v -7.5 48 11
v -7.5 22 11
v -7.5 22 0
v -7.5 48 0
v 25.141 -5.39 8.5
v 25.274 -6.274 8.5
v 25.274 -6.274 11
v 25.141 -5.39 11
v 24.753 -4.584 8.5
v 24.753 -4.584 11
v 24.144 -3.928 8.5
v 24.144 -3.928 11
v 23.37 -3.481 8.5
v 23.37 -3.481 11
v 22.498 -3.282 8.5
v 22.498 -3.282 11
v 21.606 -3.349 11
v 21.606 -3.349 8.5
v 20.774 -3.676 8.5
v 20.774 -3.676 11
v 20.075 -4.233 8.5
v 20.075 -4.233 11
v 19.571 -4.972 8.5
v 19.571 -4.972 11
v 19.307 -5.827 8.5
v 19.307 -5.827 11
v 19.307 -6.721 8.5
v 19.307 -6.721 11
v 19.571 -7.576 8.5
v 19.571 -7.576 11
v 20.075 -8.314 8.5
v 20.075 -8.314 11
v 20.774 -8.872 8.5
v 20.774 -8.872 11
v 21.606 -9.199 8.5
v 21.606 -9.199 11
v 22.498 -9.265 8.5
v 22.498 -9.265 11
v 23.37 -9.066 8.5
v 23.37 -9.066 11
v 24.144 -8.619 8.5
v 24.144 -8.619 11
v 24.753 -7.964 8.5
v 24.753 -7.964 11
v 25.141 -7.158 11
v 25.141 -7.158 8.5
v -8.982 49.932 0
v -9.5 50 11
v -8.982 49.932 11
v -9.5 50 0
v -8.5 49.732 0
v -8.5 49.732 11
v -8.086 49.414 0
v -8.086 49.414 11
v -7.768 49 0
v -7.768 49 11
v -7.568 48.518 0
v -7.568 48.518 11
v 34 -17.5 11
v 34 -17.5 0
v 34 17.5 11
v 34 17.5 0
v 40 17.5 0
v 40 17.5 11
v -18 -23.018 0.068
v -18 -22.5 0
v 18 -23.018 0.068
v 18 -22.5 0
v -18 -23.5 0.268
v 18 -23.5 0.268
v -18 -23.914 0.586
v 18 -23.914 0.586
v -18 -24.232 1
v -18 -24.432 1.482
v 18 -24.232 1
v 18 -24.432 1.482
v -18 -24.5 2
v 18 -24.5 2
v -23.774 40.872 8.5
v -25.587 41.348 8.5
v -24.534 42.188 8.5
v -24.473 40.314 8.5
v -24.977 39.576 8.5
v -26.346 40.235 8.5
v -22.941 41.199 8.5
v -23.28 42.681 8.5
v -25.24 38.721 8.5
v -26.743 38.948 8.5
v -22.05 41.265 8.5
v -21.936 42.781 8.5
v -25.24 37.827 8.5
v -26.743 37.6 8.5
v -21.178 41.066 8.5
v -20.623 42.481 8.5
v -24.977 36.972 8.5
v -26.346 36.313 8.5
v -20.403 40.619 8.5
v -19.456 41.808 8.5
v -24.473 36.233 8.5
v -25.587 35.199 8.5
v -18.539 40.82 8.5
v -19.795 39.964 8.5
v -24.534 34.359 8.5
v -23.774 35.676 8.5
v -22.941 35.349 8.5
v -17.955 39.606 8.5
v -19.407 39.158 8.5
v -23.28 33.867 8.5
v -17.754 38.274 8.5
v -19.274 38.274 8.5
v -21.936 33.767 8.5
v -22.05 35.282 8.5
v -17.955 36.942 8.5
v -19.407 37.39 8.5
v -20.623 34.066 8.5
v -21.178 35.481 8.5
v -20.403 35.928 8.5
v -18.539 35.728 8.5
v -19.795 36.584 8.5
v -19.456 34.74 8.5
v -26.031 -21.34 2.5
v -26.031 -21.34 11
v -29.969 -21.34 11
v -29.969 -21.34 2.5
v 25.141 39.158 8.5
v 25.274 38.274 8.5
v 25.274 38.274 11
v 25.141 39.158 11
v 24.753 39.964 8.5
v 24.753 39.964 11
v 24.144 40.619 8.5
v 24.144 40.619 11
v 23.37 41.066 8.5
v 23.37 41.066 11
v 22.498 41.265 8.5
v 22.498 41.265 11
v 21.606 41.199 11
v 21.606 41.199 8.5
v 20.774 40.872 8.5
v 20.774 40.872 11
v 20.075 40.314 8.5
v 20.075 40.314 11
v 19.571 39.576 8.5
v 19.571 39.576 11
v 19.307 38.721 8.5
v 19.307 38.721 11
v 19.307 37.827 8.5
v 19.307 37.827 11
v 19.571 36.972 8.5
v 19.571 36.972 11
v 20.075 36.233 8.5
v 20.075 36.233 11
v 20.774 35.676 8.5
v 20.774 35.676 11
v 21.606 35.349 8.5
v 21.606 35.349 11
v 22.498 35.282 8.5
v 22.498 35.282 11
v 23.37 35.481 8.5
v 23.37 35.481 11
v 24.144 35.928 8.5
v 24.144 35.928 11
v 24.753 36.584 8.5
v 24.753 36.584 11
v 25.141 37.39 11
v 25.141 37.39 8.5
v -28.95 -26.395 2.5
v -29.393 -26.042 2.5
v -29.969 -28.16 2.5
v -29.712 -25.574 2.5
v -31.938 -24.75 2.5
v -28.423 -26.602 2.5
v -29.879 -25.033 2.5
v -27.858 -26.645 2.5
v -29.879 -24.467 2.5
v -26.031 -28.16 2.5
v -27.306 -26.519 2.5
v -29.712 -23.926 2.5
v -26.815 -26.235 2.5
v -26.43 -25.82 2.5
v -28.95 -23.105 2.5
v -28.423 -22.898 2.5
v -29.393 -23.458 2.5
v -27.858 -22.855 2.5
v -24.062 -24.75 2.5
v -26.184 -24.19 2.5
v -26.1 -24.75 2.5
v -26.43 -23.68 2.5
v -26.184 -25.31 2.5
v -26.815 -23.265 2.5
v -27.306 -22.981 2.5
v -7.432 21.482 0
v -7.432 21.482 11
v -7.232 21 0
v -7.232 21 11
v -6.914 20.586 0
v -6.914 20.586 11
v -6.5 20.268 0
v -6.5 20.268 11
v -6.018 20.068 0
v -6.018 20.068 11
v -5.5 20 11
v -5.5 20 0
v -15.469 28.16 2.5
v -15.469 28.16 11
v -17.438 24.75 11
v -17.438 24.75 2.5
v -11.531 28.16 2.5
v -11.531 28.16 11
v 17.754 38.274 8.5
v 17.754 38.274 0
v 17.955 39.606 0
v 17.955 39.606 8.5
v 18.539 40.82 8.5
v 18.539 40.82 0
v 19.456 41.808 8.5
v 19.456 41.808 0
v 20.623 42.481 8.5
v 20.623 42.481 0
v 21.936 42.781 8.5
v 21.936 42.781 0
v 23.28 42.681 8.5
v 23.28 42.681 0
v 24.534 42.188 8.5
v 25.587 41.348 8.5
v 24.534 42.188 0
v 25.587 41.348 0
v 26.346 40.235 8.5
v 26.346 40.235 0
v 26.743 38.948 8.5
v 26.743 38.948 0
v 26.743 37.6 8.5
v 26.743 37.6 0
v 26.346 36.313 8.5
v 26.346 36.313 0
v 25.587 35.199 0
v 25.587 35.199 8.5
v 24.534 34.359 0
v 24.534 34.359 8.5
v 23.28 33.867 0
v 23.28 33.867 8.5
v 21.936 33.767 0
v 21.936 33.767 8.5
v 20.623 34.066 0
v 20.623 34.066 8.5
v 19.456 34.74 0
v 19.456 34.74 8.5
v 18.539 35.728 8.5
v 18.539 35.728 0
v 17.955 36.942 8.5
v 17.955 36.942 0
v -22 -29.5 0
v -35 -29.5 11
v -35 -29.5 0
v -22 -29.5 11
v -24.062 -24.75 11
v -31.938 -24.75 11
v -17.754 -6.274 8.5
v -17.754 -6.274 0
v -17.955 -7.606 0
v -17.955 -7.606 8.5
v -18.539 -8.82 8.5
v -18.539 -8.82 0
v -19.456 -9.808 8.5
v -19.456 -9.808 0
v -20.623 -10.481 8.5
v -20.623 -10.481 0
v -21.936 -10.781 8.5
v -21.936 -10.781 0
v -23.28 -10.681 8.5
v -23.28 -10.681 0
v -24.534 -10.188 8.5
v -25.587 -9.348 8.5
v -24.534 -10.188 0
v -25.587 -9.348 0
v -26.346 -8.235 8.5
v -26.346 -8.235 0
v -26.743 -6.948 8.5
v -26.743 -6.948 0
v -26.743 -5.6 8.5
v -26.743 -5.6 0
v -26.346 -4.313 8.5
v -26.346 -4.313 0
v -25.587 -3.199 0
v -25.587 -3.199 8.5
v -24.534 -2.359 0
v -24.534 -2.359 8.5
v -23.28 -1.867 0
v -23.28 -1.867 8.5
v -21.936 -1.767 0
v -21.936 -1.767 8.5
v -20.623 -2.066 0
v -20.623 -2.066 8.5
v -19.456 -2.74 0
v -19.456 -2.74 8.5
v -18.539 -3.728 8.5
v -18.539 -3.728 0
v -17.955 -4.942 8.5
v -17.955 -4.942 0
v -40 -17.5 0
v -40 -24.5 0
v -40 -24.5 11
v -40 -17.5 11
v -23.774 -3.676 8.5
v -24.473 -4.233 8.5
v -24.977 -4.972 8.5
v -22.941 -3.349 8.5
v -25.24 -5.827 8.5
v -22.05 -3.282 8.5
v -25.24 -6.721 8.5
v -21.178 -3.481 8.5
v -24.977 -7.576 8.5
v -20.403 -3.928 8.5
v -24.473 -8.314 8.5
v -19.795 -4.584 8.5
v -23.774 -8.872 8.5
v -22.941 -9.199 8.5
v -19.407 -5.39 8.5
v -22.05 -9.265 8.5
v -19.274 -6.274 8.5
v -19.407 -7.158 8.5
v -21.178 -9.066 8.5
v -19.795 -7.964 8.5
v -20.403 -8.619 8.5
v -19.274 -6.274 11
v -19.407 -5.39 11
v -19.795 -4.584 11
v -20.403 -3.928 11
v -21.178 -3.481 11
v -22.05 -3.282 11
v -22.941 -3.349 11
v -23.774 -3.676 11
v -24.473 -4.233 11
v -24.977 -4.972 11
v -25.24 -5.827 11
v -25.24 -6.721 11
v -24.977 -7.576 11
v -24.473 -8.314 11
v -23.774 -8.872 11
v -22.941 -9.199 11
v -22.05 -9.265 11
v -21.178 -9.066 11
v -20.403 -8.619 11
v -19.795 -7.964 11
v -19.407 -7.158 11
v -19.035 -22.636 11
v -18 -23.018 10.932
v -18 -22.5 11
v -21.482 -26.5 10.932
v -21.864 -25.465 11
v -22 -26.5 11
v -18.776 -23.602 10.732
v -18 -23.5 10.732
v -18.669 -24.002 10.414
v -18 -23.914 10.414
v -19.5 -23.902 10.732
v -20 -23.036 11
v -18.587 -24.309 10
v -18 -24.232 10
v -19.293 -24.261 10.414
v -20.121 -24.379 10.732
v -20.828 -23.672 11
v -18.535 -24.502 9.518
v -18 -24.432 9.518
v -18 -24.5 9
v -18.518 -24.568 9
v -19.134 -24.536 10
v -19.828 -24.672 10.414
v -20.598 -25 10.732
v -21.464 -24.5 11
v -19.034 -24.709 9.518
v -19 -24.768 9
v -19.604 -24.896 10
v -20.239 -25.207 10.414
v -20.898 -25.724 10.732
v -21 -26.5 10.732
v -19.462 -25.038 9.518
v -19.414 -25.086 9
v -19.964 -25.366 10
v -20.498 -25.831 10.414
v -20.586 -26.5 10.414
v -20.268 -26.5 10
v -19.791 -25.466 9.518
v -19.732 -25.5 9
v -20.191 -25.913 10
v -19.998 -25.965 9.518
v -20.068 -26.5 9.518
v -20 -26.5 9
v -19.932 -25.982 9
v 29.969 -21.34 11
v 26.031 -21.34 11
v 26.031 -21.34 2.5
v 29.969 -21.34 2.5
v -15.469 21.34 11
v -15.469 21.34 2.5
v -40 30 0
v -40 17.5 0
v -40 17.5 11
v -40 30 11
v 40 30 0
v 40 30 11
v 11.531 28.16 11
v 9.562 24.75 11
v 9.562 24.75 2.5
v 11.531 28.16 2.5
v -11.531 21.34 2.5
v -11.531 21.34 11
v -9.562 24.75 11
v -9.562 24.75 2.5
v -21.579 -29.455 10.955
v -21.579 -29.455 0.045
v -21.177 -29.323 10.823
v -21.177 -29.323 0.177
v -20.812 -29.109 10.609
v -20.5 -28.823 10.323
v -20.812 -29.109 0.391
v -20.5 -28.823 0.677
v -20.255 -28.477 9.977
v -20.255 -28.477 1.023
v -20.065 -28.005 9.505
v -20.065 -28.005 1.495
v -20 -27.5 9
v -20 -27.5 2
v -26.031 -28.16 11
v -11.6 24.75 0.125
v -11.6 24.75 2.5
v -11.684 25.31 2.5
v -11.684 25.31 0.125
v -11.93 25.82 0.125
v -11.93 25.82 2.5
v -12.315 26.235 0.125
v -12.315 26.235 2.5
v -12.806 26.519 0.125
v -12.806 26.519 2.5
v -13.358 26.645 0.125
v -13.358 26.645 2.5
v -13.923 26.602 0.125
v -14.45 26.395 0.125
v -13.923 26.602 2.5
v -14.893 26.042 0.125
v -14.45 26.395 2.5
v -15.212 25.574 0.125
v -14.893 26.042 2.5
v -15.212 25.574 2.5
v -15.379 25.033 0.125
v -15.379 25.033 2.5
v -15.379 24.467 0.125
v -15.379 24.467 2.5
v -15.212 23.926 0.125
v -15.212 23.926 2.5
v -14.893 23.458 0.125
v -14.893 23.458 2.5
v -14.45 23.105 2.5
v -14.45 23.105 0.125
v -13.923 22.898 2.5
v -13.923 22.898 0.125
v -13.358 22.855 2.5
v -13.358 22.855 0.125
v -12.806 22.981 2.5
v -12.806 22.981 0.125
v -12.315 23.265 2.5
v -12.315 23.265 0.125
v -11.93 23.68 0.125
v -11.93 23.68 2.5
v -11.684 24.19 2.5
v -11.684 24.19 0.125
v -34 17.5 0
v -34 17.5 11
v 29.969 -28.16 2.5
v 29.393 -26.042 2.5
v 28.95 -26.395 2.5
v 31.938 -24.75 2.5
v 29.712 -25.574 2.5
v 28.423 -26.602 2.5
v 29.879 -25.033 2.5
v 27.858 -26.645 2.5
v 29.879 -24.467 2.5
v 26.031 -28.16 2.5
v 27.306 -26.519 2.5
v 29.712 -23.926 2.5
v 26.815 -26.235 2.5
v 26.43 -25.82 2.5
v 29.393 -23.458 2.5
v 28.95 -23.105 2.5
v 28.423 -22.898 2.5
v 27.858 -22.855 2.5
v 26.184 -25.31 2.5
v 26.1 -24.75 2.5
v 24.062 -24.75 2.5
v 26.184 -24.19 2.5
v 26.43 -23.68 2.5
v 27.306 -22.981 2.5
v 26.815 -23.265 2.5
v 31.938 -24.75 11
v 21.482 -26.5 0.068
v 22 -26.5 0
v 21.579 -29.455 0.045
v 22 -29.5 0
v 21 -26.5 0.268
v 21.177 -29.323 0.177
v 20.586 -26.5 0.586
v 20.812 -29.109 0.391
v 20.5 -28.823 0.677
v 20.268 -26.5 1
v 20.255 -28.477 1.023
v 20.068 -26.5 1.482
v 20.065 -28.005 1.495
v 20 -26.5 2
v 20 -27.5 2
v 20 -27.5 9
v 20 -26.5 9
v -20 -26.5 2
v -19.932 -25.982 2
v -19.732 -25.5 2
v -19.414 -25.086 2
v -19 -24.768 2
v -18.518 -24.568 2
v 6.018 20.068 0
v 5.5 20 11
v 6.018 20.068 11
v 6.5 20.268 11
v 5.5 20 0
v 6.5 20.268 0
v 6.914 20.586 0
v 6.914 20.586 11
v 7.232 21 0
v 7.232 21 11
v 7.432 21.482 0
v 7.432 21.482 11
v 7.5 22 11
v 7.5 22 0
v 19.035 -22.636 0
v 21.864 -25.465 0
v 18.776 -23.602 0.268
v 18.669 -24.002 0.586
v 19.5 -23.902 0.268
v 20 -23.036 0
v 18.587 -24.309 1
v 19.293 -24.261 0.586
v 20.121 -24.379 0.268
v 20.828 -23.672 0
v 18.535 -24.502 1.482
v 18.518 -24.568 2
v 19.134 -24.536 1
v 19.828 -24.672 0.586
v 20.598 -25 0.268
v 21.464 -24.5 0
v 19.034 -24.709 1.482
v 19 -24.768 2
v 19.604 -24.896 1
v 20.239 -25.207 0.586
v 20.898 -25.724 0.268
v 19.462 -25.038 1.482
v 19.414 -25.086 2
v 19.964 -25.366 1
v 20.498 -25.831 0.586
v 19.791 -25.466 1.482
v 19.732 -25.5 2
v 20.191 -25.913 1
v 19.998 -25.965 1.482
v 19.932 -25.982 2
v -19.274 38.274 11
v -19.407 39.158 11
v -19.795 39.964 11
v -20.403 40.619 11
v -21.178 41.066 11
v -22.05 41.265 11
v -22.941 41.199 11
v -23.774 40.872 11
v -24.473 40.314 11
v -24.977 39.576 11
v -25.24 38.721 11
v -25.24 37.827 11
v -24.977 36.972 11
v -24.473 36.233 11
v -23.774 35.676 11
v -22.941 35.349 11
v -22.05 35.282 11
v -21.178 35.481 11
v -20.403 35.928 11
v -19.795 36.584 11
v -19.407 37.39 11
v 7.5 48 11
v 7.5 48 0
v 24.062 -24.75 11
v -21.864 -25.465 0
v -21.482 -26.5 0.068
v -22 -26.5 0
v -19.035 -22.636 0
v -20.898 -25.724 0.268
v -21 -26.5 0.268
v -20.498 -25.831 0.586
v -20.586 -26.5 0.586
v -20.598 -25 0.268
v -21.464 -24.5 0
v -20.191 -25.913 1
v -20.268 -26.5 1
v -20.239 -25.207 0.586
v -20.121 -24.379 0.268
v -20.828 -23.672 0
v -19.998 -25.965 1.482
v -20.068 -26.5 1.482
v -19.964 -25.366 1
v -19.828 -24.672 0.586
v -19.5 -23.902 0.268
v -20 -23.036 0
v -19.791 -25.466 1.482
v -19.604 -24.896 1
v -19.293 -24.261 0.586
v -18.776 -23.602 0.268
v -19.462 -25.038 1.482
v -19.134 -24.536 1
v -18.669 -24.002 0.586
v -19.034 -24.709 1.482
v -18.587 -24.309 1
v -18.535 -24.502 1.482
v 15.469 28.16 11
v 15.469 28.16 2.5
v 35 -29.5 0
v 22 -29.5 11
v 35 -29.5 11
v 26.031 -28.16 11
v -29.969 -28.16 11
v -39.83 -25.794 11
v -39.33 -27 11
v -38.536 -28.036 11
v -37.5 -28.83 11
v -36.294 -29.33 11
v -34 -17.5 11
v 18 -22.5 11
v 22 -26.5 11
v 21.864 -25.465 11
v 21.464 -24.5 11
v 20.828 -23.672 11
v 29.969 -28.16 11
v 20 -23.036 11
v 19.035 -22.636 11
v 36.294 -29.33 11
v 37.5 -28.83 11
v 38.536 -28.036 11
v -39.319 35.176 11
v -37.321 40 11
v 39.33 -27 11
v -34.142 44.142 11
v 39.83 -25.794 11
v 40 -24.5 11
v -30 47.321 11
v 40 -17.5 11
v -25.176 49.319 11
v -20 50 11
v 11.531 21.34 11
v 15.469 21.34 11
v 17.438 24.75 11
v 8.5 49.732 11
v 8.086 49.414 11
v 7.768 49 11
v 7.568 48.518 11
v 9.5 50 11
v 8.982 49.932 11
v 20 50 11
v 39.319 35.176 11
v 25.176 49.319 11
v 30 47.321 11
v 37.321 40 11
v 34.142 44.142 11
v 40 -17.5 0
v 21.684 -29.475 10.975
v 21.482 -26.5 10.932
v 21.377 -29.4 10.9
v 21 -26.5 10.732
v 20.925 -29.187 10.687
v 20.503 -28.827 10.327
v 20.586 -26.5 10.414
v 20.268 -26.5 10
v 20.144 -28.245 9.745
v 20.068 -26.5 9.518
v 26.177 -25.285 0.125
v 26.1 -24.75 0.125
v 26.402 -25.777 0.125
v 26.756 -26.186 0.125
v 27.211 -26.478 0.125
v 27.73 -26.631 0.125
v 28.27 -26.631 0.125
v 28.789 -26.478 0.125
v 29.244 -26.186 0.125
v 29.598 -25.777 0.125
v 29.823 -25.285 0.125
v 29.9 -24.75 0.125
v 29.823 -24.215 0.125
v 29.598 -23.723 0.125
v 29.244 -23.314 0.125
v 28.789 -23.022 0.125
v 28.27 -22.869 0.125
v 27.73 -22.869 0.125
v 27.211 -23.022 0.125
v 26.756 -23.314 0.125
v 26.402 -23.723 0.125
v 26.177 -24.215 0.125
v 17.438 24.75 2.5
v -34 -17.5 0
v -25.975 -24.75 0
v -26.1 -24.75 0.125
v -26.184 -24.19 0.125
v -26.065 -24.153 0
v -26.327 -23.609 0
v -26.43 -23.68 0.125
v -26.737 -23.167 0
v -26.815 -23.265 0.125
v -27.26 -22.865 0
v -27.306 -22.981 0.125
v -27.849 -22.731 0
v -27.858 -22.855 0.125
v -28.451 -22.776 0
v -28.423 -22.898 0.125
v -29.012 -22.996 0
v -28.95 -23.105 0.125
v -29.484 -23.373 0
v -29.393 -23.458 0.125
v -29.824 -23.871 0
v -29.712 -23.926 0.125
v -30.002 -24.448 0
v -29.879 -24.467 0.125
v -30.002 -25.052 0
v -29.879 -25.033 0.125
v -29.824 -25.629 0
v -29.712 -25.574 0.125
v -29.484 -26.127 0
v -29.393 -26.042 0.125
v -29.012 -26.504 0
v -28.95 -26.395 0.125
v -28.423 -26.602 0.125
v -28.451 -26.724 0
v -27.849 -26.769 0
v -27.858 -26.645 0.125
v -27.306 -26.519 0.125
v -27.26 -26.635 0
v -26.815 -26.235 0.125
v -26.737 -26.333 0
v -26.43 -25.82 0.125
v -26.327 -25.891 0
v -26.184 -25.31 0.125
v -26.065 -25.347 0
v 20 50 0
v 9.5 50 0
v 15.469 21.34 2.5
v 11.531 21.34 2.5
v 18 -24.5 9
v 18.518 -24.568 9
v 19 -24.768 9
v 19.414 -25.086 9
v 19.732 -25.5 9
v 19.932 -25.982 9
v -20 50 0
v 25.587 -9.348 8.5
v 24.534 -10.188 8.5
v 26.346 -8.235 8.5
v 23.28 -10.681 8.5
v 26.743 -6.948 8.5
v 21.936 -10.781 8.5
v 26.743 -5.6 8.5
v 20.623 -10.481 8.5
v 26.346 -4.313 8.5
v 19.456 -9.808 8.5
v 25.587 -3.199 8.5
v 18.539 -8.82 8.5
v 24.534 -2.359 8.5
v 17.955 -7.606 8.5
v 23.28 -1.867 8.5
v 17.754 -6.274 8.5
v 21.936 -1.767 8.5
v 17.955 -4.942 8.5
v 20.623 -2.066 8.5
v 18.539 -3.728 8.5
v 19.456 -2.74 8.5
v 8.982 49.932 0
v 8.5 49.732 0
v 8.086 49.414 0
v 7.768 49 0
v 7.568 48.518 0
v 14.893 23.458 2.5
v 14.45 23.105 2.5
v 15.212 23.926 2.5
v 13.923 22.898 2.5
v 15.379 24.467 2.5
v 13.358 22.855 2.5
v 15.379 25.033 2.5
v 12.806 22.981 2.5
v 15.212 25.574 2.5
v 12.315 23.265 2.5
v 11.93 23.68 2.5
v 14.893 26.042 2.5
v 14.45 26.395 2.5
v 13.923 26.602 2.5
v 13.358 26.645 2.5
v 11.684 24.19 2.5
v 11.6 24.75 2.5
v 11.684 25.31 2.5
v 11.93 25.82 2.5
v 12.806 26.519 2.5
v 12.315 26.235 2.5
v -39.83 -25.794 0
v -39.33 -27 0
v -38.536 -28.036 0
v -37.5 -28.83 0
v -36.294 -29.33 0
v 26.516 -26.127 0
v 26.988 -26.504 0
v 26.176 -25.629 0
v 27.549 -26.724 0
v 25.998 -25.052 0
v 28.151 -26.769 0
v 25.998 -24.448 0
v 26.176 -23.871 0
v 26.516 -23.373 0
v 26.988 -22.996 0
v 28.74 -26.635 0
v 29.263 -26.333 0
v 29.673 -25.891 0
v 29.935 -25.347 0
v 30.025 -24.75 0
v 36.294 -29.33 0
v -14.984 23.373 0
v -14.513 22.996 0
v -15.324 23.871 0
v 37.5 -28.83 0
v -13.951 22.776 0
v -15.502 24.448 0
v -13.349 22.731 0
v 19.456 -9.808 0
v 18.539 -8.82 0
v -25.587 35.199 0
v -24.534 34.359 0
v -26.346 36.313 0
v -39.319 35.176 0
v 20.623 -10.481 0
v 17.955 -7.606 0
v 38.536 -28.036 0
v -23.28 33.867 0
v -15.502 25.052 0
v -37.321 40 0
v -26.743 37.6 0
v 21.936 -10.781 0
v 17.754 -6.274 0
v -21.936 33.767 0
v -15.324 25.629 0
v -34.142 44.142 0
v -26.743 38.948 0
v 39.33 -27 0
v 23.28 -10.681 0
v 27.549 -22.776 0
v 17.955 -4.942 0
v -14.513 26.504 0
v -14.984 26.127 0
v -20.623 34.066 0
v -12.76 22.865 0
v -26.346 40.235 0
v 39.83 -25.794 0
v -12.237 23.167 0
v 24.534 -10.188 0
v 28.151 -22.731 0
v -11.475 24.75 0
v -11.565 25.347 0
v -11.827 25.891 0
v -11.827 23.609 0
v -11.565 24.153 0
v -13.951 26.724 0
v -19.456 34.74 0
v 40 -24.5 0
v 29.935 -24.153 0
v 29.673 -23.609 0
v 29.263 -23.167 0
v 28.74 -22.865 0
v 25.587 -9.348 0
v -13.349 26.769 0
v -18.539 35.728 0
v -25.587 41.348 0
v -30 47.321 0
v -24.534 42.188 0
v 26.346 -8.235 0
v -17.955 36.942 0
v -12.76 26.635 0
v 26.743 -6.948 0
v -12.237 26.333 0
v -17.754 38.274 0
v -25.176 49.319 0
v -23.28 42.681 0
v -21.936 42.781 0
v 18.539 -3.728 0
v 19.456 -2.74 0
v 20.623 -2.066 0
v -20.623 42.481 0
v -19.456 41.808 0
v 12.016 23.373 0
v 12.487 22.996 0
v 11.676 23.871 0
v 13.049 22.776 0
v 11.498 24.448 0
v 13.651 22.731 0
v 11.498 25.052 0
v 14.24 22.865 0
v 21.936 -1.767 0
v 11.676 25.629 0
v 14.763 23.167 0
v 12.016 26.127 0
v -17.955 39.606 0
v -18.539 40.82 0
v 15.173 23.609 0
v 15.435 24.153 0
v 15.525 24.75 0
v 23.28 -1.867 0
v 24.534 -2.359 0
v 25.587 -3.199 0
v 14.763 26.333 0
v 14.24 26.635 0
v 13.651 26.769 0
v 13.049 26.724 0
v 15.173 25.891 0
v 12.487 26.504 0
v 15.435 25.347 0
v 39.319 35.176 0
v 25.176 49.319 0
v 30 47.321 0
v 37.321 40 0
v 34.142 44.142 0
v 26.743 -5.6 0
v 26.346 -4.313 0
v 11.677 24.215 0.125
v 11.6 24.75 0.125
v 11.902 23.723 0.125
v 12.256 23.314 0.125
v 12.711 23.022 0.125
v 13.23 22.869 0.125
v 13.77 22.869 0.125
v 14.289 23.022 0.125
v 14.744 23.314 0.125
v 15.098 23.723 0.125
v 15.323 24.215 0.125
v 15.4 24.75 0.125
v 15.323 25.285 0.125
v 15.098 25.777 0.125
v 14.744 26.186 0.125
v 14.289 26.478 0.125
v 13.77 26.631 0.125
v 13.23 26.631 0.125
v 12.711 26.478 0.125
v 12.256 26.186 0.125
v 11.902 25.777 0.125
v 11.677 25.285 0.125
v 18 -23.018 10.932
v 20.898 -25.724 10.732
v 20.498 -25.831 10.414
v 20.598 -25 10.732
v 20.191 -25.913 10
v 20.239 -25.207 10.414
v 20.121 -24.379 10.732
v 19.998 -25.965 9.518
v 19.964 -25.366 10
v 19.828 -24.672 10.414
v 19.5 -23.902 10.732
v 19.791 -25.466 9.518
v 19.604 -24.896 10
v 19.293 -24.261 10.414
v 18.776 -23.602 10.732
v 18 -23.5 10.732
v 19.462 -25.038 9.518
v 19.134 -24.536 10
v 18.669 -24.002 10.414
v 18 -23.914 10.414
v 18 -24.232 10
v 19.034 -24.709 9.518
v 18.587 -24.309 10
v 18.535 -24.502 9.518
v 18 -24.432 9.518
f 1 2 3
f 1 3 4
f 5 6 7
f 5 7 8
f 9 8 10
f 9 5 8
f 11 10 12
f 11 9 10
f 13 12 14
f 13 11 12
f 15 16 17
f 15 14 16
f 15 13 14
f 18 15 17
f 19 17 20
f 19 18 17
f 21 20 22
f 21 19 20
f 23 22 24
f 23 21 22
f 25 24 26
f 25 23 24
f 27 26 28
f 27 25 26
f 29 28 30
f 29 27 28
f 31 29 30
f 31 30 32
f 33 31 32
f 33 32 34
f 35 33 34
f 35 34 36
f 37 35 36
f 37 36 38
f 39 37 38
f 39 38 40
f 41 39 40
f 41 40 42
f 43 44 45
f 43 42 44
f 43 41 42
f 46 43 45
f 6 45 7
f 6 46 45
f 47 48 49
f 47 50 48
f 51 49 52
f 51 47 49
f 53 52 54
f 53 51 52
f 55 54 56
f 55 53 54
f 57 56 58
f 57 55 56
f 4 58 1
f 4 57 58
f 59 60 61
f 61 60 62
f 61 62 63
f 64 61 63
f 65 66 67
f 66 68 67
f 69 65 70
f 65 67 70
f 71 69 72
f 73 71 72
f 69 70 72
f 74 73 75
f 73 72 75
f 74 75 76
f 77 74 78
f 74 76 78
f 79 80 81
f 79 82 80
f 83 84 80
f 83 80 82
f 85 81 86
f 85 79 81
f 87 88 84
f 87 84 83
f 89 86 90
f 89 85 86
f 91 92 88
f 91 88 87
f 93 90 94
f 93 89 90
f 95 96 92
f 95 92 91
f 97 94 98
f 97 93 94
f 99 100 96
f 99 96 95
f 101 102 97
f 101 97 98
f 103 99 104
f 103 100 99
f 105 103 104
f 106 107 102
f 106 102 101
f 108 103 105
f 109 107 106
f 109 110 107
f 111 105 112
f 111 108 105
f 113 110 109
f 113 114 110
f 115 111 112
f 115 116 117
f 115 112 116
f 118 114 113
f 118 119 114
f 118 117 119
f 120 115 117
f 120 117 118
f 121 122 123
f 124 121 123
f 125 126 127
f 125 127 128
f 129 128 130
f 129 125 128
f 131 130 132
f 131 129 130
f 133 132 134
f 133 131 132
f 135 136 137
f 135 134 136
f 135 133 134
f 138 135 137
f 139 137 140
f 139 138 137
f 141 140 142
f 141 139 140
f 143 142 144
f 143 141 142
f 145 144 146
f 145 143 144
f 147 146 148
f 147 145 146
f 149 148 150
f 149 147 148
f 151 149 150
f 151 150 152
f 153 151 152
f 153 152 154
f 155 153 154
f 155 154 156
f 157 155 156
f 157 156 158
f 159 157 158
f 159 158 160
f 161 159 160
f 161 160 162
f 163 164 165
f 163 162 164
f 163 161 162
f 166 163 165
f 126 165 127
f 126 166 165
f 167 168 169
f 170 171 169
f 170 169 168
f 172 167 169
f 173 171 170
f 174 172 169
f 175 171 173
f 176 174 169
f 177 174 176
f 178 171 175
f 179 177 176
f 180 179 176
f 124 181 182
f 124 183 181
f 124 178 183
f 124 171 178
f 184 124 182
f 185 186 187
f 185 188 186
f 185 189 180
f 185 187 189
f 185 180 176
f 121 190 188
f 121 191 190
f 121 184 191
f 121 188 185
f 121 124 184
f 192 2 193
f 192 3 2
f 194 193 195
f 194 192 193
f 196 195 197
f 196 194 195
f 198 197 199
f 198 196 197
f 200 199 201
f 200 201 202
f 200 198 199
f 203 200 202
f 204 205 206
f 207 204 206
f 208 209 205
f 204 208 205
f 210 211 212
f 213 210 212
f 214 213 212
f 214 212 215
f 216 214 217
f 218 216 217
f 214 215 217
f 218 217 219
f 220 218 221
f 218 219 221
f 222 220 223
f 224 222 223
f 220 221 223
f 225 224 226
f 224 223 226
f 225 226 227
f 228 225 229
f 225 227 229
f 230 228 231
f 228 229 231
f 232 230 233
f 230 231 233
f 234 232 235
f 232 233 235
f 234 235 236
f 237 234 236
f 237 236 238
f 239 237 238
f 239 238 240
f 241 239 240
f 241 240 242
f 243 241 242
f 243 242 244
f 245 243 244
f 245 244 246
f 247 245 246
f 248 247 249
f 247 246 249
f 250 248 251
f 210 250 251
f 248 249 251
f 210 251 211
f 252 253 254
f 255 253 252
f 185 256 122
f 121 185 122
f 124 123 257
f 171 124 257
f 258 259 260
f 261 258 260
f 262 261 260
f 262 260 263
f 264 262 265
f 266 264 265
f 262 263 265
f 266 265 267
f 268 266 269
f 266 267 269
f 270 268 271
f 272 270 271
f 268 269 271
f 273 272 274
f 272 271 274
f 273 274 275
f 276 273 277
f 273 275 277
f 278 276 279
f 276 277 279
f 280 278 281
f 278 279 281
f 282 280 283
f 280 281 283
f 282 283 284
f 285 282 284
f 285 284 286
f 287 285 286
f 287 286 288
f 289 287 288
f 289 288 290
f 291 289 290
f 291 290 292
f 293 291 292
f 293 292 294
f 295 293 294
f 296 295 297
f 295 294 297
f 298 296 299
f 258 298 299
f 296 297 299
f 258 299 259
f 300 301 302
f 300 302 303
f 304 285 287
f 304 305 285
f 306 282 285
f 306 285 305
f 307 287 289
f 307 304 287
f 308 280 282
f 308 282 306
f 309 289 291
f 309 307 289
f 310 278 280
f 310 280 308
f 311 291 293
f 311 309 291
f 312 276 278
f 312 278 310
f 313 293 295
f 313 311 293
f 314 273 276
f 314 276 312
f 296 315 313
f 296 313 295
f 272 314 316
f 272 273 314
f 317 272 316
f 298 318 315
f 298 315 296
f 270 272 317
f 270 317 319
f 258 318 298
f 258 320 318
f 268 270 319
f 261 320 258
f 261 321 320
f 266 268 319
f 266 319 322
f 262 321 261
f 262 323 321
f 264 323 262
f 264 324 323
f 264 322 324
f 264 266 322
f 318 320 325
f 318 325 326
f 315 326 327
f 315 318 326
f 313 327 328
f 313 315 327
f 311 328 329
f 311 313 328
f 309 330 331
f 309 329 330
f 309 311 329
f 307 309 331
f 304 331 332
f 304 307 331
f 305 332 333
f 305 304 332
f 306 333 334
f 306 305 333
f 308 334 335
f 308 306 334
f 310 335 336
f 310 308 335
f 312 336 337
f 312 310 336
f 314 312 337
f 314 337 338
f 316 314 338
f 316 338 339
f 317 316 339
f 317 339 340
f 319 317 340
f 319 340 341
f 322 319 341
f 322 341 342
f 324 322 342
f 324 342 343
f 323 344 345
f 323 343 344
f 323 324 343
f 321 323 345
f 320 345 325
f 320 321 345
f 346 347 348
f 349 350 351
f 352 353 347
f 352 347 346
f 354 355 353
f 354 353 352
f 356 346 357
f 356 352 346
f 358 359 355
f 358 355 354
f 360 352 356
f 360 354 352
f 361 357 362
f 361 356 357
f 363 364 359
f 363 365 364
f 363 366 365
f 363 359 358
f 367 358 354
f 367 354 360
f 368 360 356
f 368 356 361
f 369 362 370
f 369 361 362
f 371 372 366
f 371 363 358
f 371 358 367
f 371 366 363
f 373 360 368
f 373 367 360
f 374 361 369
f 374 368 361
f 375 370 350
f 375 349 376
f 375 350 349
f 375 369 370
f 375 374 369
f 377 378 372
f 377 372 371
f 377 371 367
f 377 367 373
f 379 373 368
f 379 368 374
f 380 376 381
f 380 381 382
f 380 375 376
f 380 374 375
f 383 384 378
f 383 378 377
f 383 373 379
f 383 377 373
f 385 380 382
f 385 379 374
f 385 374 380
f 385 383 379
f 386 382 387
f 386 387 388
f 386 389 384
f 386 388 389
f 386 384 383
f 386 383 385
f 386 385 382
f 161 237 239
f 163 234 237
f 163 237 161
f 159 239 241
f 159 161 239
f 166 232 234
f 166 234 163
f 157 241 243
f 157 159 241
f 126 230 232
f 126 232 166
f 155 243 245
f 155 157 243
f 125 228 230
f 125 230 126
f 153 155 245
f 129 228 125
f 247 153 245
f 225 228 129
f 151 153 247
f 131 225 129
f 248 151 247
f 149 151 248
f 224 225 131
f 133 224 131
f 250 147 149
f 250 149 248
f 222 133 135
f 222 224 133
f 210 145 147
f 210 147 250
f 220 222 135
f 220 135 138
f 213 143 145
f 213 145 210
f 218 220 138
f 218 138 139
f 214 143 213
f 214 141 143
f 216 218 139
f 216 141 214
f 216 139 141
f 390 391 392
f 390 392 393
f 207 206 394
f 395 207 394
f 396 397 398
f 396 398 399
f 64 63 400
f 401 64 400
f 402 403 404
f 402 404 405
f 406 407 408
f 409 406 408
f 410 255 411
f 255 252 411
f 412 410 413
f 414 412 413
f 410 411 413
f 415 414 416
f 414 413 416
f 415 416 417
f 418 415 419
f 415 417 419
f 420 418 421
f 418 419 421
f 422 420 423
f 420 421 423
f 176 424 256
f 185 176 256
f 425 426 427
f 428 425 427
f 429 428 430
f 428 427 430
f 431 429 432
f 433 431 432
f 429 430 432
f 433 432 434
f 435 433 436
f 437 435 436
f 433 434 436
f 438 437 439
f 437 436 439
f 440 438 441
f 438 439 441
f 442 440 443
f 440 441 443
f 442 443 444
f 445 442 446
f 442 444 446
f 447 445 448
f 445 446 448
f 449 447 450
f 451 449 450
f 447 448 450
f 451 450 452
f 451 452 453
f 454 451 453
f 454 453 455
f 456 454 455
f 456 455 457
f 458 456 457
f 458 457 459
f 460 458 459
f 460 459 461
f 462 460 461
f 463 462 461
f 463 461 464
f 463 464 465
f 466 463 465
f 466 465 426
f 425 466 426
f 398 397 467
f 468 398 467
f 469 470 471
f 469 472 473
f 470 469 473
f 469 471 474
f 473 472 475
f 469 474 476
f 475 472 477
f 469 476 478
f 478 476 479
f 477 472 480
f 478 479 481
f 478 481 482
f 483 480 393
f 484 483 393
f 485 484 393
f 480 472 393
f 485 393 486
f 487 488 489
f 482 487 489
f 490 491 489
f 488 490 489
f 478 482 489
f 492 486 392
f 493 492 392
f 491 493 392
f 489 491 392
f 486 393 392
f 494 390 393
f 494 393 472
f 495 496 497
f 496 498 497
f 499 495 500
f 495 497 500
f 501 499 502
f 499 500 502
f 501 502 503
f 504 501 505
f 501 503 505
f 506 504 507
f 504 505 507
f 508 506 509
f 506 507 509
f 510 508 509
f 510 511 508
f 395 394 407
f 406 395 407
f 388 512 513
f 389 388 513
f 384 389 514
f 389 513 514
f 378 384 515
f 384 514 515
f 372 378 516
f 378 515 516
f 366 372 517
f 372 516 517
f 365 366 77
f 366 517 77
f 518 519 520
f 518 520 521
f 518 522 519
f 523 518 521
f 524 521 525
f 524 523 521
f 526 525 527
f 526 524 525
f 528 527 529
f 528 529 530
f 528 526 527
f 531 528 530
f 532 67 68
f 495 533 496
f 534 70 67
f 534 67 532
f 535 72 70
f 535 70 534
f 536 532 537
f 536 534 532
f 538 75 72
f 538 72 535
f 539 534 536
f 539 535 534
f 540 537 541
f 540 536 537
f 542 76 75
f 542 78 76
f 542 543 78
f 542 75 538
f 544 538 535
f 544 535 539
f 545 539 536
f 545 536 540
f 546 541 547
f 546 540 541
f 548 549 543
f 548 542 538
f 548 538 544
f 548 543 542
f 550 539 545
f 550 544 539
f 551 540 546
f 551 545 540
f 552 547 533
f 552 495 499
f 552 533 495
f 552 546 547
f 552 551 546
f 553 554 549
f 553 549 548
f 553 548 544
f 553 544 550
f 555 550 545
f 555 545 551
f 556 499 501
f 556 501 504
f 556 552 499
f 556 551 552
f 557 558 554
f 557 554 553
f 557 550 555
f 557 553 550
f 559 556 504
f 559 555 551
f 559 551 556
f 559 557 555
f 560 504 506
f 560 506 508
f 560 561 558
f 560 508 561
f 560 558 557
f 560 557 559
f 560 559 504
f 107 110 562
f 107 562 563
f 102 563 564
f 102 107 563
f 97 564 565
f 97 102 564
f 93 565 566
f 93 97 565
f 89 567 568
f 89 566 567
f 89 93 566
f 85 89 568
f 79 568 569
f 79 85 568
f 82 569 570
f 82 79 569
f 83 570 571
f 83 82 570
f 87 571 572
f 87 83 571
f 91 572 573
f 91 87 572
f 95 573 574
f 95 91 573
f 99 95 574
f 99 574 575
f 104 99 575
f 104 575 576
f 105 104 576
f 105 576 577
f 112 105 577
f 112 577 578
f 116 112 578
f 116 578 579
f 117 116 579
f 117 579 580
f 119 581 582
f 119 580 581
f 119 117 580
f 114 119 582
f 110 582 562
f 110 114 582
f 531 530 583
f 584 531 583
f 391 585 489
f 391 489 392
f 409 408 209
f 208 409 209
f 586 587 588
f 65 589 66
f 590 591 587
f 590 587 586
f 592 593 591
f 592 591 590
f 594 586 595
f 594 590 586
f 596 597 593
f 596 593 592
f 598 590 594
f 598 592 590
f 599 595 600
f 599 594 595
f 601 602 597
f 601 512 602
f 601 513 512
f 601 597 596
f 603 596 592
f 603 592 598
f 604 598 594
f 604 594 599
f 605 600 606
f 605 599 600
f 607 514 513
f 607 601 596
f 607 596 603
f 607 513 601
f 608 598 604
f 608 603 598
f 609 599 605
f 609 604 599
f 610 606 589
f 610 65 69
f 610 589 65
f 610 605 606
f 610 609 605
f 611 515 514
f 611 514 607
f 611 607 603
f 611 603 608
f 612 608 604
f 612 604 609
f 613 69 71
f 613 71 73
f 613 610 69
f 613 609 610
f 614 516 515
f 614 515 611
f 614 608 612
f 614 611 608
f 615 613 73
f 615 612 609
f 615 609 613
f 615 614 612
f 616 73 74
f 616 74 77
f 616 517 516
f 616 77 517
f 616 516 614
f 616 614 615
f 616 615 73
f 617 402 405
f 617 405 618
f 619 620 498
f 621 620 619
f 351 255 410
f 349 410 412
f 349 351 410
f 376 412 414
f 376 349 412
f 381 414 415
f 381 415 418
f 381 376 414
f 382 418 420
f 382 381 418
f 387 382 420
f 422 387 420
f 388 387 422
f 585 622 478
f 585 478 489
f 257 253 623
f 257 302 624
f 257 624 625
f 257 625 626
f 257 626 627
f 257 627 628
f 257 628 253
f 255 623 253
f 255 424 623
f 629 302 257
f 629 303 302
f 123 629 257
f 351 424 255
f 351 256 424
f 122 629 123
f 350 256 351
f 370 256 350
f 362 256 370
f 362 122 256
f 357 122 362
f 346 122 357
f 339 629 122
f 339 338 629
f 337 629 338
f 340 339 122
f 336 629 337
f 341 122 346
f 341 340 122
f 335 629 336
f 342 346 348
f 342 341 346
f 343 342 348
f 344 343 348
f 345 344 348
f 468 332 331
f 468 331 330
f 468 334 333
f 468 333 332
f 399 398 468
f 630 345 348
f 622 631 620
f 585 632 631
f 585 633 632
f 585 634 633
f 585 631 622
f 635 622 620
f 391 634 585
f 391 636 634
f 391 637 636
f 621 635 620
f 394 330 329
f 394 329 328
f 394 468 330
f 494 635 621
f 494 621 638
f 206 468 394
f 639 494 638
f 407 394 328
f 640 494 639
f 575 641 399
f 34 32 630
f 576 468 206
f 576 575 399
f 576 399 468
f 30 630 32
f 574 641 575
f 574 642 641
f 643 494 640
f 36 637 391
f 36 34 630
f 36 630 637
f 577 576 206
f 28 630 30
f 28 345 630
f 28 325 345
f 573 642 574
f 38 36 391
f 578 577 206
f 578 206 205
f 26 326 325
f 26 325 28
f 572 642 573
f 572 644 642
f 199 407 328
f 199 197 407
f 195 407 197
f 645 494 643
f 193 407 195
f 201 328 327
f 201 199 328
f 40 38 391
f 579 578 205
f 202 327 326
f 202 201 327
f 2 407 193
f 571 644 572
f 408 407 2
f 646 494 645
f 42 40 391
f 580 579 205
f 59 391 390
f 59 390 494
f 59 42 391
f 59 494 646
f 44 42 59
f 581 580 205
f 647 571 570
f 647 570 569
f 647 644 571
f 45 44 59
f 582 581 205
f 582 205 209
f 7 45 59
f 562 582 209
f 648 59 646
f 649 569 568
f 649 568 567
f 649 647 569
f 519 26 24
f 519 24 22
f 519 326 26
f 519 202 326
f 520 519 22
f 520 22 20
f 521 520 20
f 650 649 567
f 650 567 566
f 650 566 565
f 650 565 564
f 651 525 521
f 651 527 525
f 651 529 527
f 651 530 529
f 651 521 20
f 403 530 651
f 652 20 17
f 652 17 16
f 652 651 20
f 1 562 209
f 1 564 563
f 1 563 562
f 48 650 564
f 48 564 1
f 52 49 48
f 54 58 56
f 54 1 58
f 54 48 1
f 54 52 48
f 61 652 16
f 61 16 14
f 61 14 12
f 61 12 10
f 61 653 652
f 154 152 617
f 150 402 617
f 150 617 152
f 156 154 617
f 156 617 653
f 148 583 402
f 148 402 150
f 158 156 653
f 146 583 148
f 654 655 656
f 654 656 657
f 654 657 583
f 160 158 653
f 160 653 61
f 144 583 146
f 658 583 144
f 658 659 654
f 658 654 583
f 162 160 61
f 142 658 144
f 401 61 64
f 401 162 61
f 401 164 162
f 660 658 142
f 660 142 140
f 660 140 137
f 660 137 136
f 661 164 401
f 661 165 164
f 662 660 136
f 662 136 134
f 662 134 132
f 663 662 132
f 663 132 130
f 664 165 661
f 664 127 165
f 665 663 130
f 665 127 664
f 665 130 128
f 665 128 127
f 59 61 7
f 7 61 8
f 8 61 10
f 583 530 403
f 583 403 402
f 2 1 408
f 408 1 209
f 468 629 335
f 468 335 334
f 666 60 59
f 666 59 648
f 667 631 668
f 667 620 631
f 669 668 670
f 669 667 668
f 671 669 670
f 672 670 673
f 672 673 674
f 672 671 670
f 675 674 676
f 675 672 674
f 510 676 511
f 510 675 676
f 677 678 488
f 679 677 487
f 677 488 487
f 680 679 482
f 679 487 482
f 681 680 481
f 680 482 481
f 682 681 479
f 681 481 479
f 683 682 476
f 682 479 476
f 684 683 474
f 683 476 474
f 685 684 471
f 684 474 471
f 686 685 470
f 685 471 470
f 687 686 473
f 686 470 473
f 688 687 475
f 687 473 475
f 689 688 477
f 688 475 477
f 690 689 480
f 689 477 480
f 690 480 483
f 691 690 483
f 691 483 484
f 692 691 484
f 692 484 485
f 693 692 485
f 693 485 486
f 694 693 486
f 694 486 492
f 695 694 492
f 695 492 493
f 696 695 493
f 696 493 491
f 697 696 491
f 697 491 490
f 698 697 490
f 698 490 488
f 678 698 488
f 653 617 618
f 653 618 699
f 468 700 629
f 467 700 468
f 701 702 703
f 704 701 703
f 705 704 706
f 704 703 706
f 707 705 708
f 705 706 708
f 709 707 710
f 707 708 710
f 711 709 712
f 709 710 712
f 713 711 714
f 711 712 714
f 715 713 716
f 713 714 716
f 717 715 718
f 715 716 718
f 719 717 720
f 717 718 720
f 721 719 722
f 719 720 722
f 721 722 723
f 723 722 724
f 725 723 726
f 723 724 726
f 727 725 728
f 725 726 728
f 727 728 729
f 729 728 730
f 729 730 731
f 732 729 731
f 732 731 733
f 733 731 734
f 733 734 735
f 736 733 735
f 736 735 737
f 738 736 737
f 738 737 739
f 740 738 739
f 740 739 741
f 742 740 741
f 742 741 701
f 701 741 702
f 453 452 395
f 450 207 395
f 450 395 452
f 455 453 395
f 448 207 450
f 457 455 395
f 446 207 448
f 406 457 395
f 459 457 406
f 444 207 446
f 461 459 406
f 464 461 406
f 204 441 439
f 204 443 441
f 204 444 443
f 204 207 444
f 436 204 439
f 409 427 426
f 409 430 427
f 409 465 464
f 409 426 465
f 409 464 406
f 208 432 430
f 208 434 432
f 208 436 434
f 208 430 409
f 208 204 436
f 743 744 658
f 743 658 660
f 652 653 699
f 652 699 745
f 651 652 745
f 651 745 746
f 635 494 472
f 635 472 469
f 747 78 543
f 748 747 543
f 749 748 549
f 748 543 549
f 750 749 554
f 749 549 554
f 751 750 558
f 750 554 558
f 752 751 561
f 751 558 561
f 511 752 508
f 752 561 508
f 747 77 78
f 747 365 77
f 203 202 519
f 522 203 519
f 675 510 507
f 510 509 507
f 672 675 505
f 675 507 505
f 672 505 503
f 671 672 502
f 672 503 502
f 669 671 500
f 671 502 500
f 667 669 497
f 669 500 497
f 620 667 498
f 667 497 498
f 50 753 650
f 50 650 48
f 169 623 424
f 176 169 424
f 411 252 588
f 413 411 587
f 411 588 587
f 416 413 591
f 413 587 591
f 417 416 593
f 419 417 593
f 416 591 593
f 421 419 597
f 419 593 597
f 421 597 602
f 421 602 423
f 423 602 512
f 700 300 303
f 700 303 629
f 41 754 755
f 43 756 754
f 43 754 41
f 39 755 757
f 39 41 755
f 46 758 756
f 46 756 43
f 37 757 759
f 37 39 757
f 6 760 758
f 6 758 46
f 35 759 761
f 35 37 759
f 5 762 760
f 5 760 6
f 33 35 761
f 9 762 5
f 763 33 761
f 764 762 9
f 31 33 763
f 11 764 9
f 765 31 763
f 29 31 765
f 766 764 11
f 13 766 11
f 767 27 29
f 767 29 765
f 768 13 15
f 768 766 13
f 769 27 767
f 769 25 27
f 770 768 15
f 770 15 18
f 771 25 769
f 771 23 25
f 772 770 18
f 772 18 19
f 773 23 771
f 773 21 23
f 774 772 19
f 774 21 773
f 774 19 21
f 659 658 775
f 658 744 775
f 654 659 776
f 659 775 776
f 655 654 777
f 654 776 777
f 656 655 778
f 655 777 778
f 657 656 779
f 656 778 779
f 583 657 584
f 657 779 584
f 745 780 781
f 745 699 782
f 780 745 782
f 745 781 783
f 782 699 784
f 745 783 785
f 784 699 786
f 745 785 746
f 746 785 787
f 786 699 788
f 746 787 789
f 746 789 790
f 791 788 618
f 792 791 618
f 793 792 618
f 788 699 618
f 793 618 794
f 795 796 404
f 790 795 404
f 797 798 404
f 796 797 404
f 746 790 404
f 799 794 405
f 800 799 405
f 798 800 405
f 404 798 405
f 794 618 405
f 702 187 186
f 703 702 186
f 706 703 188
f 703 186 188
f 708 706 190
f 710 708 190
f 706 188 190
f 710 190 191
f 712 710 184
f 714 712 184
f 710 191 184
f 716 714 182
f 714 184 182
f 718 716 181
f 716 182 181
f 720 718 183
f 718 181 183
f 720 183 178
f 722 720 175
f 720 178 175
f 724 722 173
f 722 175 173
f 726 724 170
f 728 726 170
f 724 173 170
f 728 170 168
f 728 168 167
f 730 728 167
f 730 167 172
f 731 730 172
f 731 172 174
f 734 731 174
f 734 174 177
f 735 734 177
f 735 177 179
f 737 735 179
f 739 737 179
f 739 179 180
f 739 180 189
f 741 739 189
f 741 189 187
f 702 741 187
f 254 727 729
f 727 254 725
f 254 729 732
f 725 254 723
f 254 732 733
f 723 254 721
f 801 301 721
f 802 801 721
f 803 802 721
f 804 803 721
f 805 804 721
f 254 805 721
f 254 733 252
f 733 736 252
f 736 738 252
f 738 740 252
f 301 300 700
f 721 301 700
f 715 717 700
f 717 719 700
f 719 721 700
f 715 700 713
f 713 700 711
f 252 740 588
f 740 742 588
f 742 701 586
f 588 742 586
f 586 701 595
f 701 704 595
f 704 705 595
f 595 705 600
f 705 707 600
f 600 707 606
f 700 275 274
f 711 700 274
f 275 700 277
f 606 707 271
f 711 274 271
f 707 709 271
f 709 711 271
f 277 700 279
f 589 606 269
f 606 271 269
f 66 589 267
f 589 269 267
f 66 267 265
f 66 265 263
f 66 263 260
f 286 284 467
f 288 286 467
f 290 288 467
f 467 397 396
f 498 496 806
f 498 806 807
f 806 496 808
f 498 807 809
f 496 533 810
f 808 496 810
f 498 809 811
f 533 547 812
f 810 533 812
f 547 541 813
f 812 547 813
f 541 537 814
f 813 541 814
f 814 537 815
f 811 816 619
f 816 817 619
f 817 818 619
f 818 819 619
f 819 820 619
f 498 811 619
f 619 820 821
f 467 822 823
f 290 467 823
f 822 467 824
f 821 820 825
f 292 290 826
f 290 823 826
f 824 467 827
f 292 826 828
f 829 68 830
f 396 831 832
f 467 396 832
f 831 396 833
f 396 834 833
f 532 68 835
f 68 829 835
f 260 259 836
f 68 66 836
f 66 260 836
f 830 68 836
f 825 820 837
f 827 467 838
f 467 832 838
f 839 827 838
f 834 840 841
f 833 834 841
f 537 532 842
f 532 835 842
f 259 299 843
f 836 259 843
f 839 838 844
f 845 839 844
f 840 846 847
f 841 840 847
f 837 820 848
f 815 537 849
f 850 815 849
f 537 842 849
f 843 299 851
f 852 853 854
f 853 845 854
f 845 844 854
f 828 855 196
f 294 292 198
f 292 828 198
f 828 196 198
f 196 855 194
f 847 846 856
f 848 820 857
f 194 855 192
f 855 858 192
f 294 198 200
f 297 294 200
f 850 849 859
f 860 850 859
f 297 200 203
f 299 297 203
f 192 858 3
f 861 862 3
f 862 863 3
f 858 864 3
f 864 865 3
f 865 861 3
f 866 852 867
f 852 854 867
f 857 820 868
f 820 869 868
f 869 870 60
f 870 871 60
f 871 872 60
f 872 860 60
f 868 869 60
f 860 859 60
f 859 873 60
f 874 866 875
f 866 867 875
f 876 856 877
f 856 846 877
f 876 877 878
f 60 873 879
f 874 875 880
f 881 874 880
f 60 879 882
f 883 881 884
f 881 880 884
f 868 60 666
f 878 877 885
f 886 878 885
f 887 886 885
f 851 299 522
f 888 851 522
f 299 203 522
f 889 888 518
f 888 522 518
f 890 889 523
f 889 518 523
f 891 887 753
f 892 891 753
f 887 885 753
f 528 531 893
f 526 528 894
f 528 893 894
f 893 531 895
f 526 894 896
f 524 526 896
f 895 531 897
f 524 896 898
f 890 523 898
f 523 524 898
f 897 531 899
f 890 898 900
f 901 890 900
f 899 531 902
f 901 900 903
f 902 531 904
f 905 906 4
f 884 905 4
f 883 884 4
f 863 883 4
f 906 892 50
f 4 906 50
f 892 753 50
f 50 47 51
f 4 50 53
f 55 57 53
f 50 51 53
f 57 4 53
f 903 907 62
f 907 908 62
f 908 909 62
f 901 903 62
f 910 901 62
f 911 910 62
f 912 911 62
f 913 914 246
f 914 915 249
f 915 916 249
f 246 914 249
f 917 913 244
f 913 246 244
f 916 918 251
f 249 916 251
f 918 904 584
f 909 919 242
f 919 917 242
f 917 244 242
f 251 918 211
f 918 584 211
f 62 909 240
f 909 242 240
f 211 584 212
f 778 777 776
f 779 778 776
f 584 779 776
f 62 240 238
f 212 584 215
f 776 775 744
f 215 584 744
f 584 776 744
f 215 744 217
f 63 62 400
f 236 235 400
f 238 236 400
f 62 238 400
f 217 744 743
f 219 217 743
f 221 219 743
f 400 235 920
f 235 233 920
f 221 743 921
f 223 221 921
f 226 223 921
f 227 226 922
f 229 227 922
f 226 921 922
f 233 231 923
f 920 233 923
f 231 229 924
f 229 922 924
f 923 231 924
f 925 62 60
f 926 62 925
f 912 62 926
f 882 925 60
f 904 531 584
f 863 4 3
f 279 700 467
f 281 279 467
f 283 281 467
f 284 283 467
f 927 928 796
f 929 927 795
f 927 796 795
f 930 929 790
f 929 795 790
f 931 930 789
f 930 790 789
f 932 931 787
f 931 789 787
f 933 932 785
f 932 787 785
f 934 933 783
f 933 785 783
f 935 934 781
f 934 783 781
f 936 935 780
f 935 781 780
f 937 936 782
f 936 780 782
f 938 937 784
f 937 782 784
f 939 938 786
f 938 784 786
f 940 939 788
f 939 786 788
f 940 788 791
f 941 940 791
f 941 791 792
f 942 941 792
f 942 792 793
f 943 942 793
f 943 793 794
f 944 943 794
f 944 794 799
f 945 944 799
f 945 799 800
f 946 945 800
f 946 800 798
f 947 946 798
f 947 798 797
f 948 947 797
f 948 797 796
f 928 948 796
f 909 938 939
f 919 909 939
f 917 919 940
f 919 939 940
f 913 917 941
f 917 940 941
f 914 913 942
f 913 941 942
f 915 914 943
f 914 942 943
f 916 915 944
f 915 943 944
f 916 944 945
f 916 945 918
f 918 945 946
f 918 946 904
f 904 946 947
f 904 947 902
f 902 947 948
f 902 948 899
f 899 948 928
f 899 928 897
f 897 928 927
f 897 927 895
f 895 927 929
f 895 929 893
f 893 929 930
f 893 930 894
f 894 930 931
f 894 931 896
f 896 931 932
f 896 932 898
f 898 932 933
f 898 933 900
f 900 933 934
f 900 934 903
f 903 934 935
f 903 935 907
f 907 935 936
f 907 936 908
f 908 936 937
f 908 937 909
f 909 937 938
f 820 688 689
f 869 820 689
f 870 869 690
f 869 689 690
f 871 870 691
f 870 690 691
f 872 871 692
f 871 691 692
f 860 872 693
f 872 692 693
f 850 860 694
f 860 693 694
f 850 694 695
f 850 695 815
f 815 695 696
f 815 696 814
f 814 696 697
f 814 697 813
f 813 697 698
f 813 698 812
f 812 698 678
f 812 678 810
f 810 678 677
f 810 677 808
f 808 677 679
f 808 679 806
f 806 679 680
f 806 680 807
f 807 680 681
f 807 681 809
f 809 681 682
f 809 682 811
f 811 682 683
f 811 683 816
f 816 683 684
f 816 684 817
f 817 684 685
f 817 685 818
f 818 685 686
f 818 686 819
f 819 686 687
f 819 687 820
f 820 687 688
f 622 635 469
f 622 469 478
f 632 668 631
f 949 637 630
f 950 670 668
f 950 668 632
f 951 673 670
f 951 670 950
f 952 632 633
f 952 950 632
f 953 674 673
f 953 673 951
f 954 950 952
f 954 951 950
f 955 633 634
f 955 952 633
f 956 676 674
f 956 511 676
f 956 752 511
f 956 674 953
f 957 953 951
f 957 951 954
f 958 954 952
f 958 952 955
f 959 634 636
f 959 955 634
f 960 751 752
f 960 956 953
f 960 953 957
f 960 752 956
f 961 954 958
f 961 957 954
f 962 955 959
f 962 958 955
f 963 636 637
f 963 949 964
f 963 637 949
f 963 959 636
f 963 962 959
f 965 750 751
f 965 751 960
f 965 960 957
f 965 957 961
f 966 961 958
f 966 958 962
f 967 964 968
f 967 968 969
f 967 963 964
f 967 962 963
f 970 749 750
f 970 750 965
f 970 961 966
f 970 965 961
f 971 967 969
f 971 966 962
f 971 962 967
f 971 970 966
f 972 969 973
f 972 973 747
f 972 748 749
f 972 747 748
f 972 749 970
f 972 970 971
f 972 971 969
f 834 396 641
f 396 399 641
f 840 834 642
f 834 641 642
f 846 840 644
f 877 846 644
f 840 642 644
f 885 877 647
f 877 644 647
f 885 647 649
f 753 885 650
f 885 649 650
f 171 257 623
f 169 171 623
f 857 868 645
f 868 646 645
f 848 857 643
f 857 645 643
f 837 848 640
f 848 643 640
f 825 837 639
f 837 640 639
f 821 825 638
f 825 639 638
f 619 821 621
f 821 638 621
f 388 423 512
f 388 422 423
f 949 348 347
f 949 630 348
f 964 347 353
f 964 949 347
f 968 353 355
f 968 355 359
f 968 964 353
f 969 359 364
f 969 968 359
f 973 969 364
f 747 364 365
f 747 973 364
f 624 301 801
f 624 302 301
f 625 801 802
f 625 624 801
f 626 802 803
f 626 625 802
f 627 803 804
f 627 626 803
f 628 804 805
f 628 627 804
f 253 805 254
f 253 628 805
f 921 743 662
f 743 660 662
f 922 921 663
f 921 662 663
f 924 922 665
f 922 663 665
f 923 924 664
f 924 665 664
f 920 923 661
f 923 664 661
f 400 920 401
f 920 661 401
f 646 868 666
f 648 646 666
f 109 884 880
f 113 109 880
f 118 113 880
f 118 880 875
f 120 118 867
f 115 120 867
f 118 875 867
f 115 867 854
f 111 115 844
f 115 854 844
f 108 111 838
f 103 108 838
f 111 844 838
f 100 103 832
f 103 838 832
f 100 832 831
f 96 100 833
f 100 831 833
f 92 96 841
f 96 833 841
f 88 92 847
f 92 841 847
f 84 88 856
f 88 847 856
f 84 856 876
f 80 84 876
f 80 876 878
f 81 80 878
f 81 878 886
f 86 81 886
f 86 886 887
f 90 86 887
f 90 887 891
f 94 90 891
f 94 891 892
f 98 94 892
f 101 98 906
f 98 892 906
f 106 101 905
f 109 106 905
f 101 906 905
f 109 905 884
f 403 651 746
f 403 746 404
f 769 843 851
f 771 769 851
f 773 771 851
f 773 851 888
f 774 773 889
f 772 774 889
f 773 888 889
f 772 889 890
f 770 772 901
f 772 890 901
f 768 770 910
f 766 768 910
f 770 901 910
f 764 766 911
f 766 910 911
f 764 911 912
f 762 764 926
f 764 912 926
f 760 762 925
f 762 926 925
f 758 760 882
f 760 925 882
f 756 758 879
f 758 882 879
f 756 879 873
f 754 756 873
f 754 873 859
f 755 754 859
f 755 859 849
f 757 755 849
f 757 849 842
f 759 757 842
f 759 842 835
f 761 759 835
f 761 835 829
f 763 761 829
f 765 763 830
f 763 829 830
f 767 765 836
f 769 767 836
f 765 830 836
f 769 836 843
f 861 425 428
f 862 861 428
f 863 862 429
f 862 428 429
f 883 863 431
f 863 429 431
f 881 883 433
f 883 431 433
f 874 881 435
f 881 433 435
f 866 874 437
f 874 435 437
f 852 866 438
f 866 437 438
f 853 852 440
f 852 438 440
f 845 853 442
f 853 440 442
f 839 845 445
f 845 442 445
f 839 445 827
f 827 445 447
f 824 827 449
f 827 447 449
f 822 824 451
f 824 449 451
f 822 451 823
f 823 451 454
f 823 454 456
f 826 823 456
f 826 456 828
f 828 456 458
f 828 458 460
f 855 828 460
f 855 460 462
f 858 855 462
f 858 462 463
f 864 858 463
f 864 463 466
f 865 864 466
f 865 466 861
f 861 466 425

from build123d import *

# Parameters (mm, degrees)
SKETCH_1_W                   = 80
SKETCH_1_H                   = 100
EXTRUDE_1_DEPTH              = 11
SKETCH_7_W                   = 15
SKETCH_7_H                   = 30
CUT_EXTRUDE_1_DEPTH          = 16
HOLE_WIZARD_M4_1_D           = 3.3
HOLE_WIZARD_M4_1_CSINK_D     = 4.05
HOLE_WIZARD_M4_1_CSINK_ANGLE = 90
FILLET_1_R                   = 20
FILLET_2_R                   = 2
SKETCH_9_W                   = 6
SKETCH_9_H                   = 35
CUT_EXTRUDE_2_DEPTH          = 11
SKETCH_11_R                  = 3
CUT_EXTRUDE_4_DEPTH          = 15
SKETCH_15_R                  = 1.9
CUT_EXTRUDE_8_DEPTH          = 14
SKETCH_16_R                  = 4.52
CUT_EXTRUDE_9_DEPTH          = 8.5
CUT_EXTRUDE_10_DEPTH         = 8.5
CUT_EXTRUDE_11_DEPTH         = 13.5
FILLET_4_R                   = 5
FILLET_5_R                   = 2


with BuildPart() as part:
    # 草图1 → 凸台-拉伸1 (new body)
    with BuildSketch(Plane.XY):
        Rectangle(SKETCH_1_W, SKETCH_1_H)
    extrude(amount=EXTRUDE_1_DEPTH)

    # 草图7 → 切除-拉伸1 (cut)
    with BuildSketch(Plane.XY.offset(11)):
        with Locations((0, 35)):
            Rectangle(SKETCH_7_W, SKETCH_7_H)
    extrude(amount=-CUT_EXTRUDE_1_DEPTH, mode=Mode.SUBTRACT)

    # M4 螺纹孔1 (through all)
    with Locations(Plane(origin=(13.5, 24.75, 0), x_dir=(-1, 0, 0), z_dir=(0, 0, -1))):
        with Locations((0, 0), (27, 0), (41.5, -49.5), (-14.5, -49.5)):
            CounterSinkHole(HOLE_WIZARD_M4_1_D / 2, HOLE_WIZARD_M4_1_CSINK_D / 2, counter_sink_angle=HOLE_WIZARD_M4_1_CSINK_ANGLE)

    # 圆角1
    fillet_1_edges = [part.edges().sort_by_distance(p)[0] for p in [
        (-40, 50, 5.5),
        (40, 50, 5.5),
    ]]
    fillet(fillet_1_edges, radius=FILLET_1_R)

    # 圆角2
    fillet_2_edges = [part.edges().sort_by_distance(p)[0] for p in [
        (-7.5, 20, 5.5),
        (-7.5, 50, 5.5),
        (7.5, 50, 5.5),
        (7.5, 20, 5.5),
        (40, -50, 5.5),
        (-40, -50, 5.5),
    ]]
    fillet(fillet_2_edges, radius=FILLET_2_R)

    # 草图9 → 切除-拉伸2 (cut)
    with BuildSketch(Plane.XY):
        with Locations((37, 0)):
            Rectangle(SKETCH_9_W, SKETCH_9_H)
        with Locations((-37, 0)):
            Rectangle(SKETCH_9_W, SKETCH_9_H)
    extrude(amount=CUT_EXTRUDE_2_DEPTH, mode=Mode.SUBTRACT)

    # 草图11 → 切除-拉伸4 (cut)
    with BuildSketch(Plane.XY):
        with Locations((-22.273863607, 38.273863607)):
            Circle(SKETCH_11_R)
        with Locations((22.273863607, 38.273863607)):
            Circle(SKETCH_11_R)
        with Locations((22.273863607, -6.273863607)):
            Circle(SKETCH_11_R)
        with Locations((-22.273863607, -6.273863607)):
            Circle(SKETCH_11_R)
    extrude(amount=CUT_EXTRUDE_4_DEPTH, mode=Mode.SUBTRACT)

    # 草图15 → 切除-拉伸8 (cut)
    with BuildSketch(Plane.XY.offset(11)):
        with Locations((-13.5, 24.75)):
            Circle(SKETCH_15_R)
        with Locations((-28, -24.75)):
            Circle(SKETCH_15_R)
        with Locations(Location((13.5, 24.75, 0), (0, 0, 180))):
            Circle(SKETCH_15_R)
        with Locations(Location((28, -24.75, 0), (0, 0, 180))):
            Circle(SKETCH_15_R)
    extrude(amount=-CUT_EXTRUDE_8_DEPTH, mode=Mode.SUBTRACT)

    # 草图16 → 切除-拉伸9 (cut)
    with BuildSketch(Plane(origin=(0, 0, 0), x_dir=(-1, 0, 0), z_dir=(0, 0, -1))):
        with Locations((-22.273863607, 38.273863607)):
            Circle(SKETCH_16_R)
        with Locations((-22.273863607, -6.273863607)):
            Circle(SKETCH_16_R)
        with Locations(Location((22.273863607, -6.273863607, 0), (0, 0, 180))):
            Circle(SKETCH_16_R)
        with Locations(Location((22.273863607, 38.273863607, 0), (0, 0, 180))):
            Circle(SKETCH_16_R)
    extrude(amount=-CUT_EXTRUDE_9_DEPTH, mode=Mode.SUBTRACT)

    # 草图17 → 切除-拉伸10 (cut)
    with BuildSketch(Plane.XY.offset(11)):
        Polygon((-15.468764418, 21.34), (-11.531235582, 21.34), (-9.562471164, 24.75), (-11.531235582, 28.16), (-15.468764418, 28.16), (-17.437528836, 24.75), align=None)
        Polygon((-26.031235582, -28.16), (-24.062471164, -24.75), (-26.031235582, -21.34), (-29.968764418, -21.34), (-31.937528836, -24.75), (-29.968764418, -28.16), align=None)
        Polygon((29.968764418, -28.16), (26.031235582, -28.16), (24.062471164, -24.75), (26.031235582, -21.34), (29.968764418, -21.34), (31.937528836, -24.75), align=None)
        Polygon((17.437528836, 24.75), (15.468764418, 21.34), (11.531235582, 21.34), (9.562471164, 24.75), (11.531235582, 28.16), (15.468764418, 28.16), align=None)
    extrude(amount=-CUT_EXTRUDE_10_DEPTH, mode=Mode.SUBTRACT)

    # 草图18 → 切除-拉伸11 (cut)
    with BuildSketch(Plane.XY.offset(11)):
        Polygon((-52.225177231, -29.5), (-20, -29.5), (-20, -24.5), (20, -24.5), (20, -29.5), (49.13660357, -29.5), (49.13660357, -55.082609568), (-52.225177231, -55.082609568), align=None)
    extrude(amount=-CUT_EXTRUDE_11_DEPTH, mode=Mode.SUBTRACT)

    # 圆角4
    fillet_4_edges = [part.edges().sort_by_distance(p)[0] for p in [
        (40, -29.5, 5.5),
        (-40, -29.5, 5.5),
    ]]
    fillet(fillet_4_edges, radius=FILLET_4_R)

    # 圆角5
    fillet_5_edges = [part.edges().sort_by_distance(p)[0] for p in [
        (-20, -27, 0),
        (-20, -29.5, 5.5),
        (0, -24.5, 0),
        (-20, -24.5, 5.5),
        (20, -27, 0),
        (20, -24.5, 5.5),
        (20, -29.5, 5.5),
        (20, -27, 11),
        (0, -24.5, 11),
        (-20, -27, 11),
    ]]
    fillet(fillet_5_edges, radius=FILLET_5_R)


solid = part.part
